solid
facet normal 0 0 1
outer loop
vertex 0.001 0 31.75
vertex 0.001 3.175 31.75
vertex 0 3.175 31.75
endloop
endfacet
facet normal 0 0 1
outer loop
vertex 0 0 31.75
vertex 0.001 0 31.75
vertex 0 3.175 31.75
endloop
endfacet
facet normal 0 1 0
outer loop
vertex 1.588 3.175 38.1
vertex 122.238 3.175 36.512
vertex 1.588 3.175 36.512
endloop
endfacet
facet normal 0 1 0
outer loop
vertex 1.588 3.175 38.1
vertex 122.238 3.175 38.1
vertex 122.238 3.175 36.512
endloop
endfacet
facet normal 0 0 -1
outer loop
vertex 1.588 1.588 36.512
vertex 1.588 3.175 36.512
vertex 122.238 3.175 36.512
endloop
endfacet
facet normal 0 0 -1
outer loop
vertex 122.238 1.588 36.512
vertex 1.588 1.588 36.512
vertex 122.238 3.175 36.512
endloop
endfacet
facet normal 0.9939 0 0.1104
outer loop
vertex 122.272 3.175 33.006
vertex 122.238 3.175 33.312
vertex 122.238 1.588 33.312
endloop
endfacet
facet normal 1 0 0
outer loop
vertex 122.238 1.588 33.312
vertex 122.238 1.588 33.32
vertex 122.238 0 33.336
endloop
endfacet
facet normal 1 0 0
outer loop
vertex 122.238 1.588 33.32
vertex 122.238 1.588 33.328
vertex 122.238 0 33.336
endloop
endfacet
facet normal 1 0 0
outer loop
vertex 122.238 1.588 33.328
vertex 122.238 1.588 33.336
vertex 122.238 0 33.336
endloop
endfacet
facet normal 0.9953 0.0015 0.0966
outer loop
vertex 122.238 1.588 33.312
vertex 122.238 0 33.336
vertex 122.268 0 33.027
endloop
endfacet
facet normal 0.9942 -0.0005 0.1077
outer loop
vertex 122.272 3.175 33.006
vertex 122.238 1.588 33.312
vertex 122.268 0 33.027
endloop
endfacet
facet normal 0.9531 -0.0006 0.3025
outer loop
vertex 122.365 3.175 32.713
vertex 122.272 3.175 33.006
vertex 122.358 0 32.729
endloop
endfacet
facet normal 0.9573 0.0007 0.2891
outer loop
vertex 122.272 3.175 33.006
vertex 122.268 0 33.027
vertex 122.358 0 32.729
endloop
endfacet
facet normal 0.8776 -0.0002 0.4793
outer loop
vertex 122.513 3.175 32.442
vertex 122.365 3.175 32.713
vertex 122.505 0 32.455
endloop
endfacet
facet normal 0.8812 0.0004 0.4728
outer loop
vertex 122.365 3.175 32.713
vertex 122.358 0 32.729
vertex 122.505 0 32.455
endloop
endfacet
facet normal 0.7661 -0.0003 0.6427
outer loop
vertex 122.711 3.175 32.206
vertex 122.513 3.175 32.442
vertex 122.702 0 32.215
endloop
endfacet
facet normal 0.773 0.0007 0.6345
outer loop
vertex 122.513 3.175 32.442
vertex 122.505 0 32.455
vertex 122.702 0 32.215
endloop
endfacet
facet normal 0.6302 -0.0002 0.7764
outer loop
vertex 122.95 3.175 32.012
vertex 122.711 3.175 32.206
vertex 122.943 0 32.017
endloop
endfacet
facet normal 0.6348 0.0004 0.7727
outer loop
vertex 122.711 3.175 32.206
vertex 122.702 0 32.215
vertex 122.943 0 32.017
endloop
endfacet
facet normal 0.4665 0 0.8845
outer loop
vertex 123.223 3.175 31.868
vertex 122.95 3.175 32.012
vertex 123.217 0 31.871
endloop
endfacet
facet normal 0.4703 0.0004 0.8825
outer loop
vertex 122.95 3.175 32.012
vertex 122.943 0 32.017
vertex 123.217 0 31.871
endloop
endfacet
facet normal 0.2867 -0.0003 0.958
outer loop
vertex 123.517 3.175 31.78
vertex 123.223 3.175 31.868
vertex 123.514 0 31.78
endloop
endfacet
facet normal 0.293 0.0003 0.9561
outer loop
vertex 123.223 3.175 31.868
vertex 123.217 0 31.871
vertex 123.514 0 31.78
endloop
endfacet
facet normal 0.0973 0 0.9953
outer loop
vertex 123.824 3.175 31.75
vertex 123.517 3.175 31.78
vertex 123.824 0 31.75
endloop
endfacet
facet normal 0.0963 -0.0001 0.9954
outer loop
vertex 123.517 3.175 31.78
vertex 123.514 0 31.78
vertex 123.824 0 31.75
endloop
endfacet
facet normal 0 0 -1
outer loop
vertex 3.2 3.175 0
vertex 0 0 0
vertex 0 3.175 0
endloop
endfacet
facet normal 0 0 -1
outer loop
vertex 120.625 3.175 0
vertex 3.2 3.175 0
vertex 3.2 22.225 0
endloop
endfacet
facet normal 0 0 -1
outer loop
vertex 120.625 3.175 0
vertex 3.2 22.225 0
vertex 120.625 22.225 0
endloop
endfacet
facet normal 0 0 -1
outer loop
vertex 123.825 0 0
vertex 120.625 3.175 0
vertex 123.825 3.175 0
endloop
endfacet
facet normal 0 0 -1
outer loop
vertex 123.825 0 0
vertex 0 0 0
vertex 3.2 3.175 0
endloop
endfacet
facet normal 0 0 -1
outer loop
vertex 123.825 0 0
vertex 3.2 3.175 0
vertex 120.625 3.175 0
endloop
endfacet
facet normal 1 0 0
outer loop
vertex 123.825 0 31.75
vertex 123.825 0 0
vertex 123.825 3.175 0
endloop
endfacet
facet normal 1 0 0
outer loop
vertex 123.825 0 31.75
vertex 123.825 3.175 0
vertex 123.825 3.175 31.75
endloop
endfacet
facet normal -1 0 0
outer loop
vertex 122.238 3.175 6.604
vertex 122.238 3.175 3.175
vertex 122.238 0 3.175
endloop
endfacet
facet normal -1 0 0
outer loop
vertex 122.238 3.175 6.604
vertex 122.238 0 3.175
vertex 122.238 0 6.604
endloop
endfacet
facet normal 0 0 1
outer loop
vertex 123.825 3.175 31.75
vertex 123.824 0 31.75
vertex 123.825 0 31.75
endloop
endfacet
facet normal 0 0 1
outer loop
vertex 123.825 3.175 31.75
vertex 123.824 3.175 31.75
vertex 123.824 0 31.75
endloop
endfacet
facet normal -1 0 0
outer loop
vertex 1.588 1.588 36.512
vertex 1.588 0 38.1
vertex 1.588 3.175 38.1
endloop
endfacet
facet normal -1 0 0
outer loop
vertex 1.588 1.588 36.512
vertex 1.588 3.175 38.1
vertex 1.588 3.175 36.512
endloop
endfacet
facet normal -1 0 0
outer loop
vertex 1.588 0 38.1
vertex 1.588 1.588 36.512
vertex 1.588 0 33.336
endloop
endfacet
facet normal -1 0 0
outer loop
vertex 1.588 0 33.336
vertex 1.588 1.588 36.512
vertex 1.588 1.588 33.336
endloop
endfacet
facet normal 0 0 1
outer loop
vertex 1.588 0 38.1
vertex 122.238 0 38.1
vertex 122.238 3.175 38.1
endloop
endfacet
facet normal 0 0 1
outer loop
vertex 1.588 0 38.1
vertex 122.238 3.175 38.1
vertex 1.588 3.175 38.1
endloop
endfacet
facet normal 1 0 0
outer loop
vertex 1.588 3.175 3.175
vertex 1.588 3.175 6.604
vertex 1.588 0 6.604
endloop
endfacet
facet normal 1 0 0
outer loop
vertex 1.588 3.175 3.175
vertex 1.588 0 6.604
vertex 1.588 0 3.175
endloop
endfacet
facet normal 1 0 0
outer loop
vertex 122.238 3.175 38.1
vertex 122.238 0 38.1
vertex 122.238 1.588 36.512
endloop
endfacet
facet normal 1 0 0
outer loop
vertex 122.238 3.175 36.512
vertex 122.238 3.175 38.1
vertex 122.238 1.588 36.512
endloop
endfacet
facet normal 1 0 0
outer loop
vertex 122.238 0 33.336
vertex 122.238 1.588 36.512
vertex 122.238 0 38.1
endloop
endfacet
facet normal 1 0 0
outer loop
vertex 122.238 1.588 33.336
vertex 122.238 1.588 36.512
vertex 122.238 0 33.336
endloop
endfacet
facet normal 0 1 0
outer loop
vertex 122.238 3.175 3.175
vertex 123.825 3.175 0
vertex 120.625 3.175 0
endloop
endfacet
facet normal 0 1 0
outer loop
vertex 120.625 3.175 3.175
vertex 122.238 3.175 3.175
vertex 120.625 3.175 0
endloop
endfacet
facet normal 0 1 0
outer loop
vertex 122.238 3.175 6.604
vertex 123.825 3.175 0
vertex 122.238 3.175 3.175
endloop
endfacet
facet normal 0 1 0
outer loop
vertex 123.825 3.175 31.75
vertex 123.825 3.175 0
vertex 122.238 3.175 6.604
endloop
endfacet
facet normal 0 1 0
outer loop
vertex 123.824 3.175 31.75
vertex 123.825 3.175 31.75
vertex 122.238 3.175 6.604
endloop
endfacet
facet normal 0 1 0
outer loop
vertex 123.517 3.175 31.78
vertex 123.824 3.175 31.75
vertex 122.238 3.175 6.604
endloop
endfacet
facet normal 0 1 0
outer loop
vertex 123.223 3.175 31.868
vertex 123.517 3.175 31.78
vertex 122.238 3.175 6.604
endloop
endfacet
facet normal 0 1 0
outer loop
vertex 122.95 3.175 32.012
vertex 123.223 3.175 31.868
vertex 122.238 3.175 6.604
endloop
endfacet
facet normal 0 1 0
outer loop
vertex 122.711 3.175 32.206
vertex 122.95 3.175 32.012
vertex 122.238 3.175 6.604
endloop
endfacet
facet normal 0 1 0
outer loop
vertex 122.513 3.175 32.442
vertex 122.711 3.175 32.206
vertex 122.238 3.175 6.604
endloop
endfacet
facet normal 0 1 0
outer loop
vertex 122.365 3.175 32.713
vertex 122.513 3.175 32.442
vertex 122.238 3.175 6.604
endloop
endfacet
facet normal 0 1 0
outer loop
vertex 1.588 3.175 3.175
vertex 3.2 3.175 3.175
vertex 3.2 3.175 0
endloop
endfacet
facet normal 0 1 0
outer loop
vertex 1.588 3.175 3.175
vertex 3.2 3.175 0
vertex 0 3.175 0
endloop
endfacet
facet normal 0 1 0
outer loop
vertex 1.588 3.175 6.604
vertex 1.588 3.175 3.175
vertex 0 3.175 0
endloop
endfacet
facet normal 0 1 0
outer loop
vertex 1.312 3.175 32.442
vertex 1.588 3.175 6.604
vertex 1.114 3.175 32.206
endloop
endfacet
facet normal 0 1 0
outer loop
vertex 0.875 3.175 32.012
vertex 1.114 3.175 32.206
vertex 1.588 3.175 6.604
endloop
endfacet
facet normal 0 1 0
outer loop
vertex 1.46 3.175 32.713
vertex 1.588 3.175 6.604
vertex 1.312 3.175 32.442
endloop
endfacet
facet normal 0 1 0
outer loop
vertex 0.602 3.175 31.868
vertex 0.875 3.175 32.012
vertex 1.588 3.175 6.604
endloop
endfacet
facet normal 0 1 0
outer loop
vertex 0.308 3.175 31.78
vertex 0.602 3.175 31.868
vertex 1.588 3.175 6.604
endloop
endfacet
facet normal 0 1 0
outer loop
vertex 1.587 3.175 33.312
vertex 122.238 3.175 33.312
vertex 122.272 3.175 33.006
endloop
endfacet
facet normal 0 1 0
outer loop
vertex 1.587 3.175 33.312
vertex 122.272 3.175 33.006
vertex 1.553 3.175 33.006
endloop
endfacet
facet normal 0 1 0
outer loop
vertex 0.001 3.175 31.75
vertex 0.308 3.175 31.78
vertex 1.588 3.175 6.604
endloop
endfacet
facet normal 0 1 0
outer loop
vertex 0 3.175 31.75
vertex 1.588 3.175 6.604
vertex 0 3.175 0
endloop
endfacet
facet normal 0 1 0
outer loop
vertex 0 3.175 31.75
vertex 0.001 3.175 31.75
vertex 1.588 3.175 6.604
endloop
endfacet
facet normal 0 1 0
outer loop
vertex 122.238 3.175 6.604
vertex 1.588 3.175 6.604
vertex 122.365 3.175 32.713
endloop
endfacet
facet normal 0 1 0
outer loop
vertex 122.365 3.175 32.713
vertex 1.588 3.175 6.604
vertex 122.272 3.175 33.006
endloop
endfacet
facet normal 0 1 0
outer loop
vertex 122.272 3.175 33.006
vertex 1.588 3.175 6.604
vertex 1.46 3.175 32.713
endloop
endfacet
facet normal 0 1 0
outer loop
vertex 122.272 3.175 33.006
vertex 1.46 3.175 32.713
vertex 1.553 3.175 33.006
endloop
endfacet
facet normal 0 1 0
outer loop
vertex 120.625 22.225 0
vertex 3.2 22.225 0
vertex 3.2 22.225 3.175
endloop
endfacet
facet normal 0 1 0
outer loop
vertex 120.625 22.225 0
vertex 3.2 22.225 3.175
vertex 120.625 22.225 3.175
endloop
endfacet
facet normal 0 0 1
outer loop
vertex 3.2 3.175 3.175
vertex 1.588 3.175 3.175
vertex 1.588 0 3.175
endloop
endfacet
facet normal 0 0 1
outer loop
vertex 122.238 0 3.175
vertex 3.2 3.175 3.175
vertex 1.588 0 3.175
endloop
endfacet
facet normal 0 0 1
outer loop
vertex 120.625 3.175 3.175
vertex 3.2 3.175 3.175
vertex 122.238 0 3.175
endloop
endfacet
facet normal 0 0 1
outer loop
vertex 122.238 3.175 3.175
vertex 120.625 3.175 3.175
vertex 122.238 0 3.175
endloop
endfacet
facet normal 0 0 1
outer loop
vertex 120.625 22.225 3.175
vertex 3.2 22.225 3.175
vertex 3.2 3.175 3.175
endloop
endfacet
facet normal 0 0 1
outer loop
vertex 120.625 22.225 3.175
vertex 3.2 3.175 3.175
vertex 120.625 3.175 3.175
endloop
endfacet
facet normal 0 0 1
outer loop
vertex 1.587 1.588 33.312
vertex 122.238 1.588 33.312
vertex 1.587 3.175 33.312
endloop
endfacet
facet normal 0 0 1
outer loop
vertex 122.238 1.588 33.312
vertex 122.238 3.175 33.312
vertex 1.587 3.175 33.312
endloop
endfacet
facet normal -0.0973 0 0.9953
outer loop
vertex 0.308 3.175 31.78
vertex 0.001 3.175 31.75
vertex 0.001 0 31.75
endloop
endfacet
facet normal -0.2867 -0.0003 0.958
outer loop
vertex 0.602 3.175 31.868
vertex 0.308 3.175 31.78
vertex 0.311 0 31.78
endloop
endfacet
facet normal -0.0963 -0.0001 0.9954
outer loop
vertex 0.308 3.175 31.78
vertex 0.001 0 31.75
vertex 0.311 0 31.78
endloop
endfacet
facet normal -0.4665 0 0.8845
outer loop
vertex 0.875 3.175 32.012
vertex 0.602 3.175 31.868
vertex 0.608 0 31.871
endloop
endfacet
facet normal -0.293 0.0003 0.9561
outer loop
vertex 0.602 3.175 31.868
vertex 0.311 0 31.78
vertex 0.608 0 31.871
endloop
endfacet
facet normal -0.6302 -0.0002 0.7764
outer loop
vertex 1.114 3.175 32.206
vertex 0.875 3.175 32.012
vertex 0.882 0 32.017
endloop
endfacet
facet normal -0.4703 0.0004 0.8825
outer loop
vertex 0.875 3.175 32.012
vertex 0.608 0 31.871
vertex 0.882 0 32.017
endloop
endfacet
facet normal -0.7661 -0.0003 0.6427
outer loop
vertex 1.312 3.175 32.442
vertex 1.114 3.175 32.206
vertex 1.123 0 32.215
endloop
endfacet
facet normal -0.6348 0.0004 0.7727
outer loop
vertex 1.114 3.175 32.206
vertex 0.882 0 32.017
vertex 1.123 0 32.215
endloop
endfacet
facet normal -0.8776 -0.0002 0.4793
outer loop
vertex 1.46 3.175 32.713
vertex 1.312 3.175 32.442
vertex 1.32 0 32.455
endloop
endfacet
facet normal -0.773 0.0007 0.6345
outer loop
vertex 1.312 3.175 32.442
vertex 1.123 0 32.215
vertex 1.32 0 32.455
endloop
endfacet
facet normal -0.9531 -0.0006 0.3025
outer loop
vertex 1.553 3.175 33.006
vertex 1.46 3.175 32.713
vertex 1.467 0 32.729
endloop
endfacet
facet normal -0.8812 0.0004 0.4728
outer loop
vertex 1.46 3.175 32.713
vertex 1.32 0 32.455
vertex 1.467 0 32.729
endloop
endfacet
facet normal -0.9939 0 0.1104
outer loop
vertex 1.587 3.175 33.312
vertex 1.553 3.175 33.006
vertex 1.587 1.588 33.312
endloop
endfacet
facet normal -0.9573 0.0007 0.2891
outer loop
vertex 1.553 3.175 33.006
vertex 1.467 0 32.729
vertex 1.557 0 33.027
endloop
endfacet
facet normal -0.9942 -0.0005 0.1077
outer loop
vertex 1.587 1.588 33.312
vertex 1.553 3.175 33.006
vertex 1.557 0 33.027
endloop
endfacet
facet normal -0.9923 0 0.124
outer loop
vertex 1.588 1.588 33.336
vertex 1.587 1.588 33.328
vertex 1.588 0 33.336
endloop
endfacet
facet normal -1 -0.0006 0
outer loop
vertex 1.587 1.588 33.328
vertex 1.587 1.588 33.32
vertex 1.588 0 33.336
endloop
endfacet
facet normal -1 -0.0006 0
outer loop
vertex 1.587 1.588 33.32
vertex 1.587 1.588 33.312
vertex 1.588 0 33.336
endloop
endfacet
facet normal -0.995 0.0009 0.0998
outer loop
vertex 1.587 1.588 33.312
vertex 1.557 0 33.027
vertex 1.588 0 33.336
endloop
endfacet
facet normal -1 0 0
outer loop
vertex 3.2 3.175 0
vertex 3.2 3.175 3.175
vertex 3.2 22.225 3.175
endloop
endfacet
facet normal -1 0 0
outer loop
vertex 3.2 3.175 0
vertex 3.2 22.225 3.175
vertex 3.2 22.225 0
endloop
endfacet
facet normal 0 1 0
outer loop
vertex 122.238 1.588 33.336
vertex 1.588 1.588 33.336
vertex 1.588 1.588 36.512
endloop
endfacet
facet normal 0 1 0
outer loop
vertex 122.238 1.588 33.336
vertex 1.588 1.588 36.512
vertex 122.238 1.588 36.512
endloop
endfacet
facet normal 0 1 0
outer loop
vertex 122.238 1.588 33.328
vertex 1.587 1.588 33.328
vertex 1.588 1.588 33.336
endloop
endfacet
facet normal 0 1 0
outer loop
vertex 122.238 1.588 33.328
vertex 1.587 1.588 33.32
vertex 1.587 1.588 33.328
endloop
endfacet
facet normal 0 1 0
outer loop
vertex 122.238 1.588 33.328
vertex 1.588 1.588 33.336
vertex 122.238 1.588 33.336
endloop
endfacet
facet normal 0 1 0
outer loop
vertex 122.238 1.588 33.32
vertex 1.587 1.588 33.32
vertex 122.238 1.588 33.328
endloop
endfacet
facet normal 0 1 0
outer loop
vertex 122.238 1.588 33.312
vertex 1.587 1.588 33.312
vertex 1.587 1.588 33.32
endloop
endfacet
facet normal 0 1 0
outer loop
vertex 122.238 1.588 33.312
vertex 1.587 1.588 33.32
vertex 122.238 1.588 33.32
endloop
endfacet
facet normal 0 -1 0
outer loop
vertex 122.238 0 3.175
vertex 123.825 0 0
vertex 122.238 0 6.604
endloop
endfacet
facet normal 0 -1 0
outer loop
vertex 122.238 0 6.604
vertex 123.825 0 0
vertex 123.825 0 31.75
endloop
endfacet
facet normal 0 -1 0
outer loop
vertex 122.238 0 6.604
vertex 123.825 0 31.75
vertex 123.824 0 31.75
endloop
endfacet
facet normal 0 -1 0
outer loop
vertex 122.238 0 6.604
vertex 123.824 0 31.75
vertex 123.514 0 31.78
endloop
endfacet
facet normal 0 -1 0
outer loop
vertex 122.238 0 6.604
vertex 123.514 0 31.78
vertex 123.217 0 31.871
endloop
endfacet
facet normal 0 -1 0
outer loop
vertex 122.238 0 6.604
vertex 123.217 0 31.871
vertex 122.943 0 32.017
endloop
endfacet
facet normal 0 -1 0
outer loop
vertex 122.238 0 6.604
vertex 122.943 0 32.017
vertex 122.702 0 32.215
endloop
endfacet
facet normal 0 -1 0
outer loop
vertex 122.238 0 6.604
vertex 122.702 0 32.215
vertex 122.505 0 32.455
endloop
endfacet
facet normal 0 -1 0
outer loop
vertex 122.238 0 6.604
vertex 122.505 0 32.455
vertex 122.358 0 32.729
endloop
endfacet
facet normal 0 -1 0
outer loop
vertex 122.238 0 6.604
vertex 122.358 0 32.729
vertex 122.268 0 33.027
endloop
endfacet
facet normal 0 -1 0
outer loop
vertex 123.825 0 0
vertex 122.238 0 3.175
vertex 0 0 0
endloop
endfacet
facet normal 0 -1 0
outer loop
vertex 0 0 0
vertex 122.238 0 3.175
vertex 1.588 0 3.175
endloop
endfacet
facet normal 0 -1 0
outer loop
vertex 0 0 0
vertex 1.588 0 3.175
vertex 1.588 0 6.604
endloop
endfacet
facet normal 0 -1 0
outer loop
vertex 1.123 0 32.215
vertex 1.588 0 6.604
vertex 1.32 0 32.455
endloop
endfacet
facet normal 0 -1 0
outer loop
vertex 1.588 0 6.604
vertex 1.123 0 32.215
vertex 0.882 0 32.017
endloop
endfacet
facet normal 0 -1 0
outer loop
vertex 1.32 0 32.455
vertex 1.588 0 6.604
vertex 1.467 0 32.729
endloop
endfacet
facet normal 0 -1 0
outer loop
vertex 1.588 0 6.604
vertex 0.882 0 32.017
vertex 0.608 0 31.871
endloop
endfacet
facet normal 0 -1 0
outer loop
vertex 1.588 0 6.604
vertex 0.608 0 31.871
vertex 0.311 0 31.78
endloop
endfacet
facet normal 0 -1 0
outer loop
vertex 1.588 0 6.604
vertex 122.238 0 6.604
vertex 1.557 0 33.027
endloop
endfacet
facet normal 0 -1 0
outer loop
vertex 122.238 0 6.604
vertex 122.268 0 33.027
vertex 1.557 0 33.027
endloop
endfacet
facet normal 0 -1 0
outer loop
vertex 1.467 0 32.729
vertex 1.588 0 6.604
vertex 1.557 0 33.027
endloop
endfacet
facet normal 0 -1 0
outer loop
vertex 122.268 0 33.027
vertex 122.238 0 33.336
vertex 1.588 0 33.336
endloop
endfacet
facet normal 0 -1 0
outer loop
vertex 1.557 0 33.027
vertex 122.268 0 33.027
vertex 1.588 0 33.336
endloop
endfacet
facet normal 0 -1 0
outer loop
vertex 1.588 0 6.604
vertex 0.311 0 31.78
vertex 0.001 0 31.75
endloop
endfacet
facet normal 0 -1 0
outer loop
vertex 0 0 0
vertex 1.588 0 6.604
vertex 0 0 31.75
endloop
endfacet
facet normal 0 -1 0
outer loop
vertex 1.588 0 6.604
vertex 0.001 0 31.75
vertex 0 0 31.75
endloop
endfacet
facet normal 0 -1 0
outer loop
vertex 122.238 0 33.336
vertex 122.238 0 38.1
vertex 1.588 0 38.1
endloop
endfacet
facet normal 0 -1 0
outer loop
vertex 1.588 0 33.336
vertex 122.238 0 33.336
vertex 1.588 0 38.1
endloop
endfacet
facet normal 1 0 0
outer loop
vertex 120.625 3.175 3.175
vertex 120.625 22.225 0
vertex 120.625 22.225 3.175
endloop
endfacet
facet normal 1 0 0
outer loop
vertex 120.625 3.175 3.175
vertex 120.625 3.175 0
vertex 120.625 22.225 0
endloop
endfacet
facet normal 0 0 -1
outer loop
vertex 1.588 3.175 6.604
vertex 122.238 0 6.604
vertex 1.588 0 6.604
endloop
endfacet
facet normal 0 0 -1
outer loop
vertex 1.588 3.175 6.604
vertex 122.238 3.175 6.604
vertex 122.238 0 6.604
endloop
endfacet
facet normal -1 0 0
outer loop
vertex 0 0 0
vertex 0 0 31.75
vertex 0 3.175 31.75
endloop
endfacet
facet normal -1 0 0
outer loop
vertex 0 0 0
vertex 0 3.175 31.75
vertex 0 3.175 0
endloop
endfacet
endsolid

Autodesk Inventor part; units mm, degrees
ref_plane "YZ Plane" through (0, 0, 0) normal (1, 0, 0) x (0, 1, 0)
ref_plane "XZ Plane" through (0, 0, 0) normal (0, 1, 0) x (-1, 0, 0)
ref_plane "XY Plane" through (0, 0, 0) normal (0, 0, 1) x (1, 0, 0)
sketch "Sketch1" plane through (0, 0, 0) normal (0, 1, 0) x (-1, 0, 0)
  line L0 (0, 0) -> (-123.825, 0)
  line L1 (-123.825, 0) -> (-123.825, 38.1)
  line L2 (-123.825, 38.1) -> (0, 38.1)
  line L3 (0, 38.1) -> (0, 0)
  dimension "d0" = 123.825
  dimension "d1" = 38.1
extrude "Extrusion1" add sketch "Sketch1" along normal blind 3.175
sketch "Sketch2" plane through (0, 3.175, 0) normal (0, 1, 0) x (1, 0, 0)
  line L0 (123.825, 0) -> (0, 0) projected
  line L1 (0, 0) -> (0, -38.1) projected
  line L2 (0, -38.1) -> (123.825, -38.1) projected
  line L3 (123.825, -38.1) -> (123.825, 0) projected
  line L4 (0, -36.5125) -> (123.825, -36.5125)
  line L5 (123.825, -36.5125) -> (123.825, -33.3121)
  line L6 (123.825, -33.3121) -> (0, -33.3121)
  line L7 (0, -33.3121) -> (0, -36.5125)
  line L8 (1.5875, -3.175) -> (87.3125, -3.175)
  line L9 (87.3125, -3.175) -> (87.3125, -6.604)
  line L10 (87.3125, -6.604) -> (1.5875, -6.604)
  line L11 (1.5875, -6.604) -> (1.5875, -3.175)
  dimension "d4" = 3.2004
  dimension "d5" = 1.5875
  dimension "d8" = 85.725
  dimension "d9" = 1.5875
  dimension "d10" = 3.429
  dimension "d11" = 3.175
extrude "Extrusion2" cut sketch "Sketch2" against normal blind 1.5875 contours L3 L4 L1 L6
sketch "Sketch3" plane through (0, 3.175, 0) normal (0, 1, 0) x (1, 0, 0)
  line L0 (123.825, 0) -> (0, 0) projected
  line L1 (0, 0) -> (0, -33.3121) projected
  line L2 (1.5875, -3.175) -> (122.2375, -3.175)
  line L3 (122.2375, -3.175) -> (122.2375, -6.604)
  line L4 (122.2375, -6.604) -> (1.5875, -6.604)
  line L5 (1.5875, -6.604) -> (1.5875, -3.175)
  line L6 (123.825, -33.3121) -> (123.825, 0) projected
  dimension "d15" = 3.429
  dimension "d16" = 3.175
  dimension "d17" = 1.5875
  dimension "d20" = 1.5875
extrude "Extrusion3" cut sketch "Sketch3" against normal blind 12.7
sketch "Sketch4" plane through (0, 3.175, 0) normal (0, 1, 0) x (1, 0, 0)
  line L0 (0, -38.1) -> (1.5875, -38.1)
  line L1 (1.5875, -38.1) -> (1.5875, -31.75)
  line L2 (1.5875, -31.75) -> (0, -31.75)
  line L3 (0, -31.75) -> (0, -38.1)
  line L4 (123.825, -38.1) -> (122.2375, -38.1)
  line L5 (122.2375, -38.1) -> (122.2375, -31.75)
  line L6 (122.2375, -31.75) -> (123.825, -31.75)
  line L7 (123.825, -31.75) -> (123.825, -38.1)
  point P0 (0, 0)
  dimension "d21" = 1.5875
  dimension "d22" = 6.35
  dimension "d23" = 6.35
  dimension "d24" = 1.5875
extrude "Extrusion4" cut sketch "Sketch4" against normal blind 12.7
fillet "Fillet1" radius 1.5875 2 edges at (122.2375, 1.5875, 31.75) (1.5875, 1.5875, 31.75)
sketch "Sketch5" plane through (0, 3.175, 0) normal (0, 1, 0) x (1, 0, 0)
  line L0 (123.825, -31.75) -> (123.825, 0) projected
  line L1 (3.2004, 0) -> (120.6246, 0)
  line L2 (120.6246, 0) -> (120.6246, -3.175)
  line L3 (120.6246, -3.175) -> (3.2004, -3.175)
  line L4 (3.2004, -3.175) -> (3.2004, 0)
  line L5 (0, 0) -> (0, -31.75) projected
  dimension "d31" = 3.175
  dimension "d32" = 3.2004
  dimension "d33" = 3.2004
extrude "Extrusion5" add sketch "Sketch5" along normal blind 19.05
properties part number "Electronics Container Part 5"
